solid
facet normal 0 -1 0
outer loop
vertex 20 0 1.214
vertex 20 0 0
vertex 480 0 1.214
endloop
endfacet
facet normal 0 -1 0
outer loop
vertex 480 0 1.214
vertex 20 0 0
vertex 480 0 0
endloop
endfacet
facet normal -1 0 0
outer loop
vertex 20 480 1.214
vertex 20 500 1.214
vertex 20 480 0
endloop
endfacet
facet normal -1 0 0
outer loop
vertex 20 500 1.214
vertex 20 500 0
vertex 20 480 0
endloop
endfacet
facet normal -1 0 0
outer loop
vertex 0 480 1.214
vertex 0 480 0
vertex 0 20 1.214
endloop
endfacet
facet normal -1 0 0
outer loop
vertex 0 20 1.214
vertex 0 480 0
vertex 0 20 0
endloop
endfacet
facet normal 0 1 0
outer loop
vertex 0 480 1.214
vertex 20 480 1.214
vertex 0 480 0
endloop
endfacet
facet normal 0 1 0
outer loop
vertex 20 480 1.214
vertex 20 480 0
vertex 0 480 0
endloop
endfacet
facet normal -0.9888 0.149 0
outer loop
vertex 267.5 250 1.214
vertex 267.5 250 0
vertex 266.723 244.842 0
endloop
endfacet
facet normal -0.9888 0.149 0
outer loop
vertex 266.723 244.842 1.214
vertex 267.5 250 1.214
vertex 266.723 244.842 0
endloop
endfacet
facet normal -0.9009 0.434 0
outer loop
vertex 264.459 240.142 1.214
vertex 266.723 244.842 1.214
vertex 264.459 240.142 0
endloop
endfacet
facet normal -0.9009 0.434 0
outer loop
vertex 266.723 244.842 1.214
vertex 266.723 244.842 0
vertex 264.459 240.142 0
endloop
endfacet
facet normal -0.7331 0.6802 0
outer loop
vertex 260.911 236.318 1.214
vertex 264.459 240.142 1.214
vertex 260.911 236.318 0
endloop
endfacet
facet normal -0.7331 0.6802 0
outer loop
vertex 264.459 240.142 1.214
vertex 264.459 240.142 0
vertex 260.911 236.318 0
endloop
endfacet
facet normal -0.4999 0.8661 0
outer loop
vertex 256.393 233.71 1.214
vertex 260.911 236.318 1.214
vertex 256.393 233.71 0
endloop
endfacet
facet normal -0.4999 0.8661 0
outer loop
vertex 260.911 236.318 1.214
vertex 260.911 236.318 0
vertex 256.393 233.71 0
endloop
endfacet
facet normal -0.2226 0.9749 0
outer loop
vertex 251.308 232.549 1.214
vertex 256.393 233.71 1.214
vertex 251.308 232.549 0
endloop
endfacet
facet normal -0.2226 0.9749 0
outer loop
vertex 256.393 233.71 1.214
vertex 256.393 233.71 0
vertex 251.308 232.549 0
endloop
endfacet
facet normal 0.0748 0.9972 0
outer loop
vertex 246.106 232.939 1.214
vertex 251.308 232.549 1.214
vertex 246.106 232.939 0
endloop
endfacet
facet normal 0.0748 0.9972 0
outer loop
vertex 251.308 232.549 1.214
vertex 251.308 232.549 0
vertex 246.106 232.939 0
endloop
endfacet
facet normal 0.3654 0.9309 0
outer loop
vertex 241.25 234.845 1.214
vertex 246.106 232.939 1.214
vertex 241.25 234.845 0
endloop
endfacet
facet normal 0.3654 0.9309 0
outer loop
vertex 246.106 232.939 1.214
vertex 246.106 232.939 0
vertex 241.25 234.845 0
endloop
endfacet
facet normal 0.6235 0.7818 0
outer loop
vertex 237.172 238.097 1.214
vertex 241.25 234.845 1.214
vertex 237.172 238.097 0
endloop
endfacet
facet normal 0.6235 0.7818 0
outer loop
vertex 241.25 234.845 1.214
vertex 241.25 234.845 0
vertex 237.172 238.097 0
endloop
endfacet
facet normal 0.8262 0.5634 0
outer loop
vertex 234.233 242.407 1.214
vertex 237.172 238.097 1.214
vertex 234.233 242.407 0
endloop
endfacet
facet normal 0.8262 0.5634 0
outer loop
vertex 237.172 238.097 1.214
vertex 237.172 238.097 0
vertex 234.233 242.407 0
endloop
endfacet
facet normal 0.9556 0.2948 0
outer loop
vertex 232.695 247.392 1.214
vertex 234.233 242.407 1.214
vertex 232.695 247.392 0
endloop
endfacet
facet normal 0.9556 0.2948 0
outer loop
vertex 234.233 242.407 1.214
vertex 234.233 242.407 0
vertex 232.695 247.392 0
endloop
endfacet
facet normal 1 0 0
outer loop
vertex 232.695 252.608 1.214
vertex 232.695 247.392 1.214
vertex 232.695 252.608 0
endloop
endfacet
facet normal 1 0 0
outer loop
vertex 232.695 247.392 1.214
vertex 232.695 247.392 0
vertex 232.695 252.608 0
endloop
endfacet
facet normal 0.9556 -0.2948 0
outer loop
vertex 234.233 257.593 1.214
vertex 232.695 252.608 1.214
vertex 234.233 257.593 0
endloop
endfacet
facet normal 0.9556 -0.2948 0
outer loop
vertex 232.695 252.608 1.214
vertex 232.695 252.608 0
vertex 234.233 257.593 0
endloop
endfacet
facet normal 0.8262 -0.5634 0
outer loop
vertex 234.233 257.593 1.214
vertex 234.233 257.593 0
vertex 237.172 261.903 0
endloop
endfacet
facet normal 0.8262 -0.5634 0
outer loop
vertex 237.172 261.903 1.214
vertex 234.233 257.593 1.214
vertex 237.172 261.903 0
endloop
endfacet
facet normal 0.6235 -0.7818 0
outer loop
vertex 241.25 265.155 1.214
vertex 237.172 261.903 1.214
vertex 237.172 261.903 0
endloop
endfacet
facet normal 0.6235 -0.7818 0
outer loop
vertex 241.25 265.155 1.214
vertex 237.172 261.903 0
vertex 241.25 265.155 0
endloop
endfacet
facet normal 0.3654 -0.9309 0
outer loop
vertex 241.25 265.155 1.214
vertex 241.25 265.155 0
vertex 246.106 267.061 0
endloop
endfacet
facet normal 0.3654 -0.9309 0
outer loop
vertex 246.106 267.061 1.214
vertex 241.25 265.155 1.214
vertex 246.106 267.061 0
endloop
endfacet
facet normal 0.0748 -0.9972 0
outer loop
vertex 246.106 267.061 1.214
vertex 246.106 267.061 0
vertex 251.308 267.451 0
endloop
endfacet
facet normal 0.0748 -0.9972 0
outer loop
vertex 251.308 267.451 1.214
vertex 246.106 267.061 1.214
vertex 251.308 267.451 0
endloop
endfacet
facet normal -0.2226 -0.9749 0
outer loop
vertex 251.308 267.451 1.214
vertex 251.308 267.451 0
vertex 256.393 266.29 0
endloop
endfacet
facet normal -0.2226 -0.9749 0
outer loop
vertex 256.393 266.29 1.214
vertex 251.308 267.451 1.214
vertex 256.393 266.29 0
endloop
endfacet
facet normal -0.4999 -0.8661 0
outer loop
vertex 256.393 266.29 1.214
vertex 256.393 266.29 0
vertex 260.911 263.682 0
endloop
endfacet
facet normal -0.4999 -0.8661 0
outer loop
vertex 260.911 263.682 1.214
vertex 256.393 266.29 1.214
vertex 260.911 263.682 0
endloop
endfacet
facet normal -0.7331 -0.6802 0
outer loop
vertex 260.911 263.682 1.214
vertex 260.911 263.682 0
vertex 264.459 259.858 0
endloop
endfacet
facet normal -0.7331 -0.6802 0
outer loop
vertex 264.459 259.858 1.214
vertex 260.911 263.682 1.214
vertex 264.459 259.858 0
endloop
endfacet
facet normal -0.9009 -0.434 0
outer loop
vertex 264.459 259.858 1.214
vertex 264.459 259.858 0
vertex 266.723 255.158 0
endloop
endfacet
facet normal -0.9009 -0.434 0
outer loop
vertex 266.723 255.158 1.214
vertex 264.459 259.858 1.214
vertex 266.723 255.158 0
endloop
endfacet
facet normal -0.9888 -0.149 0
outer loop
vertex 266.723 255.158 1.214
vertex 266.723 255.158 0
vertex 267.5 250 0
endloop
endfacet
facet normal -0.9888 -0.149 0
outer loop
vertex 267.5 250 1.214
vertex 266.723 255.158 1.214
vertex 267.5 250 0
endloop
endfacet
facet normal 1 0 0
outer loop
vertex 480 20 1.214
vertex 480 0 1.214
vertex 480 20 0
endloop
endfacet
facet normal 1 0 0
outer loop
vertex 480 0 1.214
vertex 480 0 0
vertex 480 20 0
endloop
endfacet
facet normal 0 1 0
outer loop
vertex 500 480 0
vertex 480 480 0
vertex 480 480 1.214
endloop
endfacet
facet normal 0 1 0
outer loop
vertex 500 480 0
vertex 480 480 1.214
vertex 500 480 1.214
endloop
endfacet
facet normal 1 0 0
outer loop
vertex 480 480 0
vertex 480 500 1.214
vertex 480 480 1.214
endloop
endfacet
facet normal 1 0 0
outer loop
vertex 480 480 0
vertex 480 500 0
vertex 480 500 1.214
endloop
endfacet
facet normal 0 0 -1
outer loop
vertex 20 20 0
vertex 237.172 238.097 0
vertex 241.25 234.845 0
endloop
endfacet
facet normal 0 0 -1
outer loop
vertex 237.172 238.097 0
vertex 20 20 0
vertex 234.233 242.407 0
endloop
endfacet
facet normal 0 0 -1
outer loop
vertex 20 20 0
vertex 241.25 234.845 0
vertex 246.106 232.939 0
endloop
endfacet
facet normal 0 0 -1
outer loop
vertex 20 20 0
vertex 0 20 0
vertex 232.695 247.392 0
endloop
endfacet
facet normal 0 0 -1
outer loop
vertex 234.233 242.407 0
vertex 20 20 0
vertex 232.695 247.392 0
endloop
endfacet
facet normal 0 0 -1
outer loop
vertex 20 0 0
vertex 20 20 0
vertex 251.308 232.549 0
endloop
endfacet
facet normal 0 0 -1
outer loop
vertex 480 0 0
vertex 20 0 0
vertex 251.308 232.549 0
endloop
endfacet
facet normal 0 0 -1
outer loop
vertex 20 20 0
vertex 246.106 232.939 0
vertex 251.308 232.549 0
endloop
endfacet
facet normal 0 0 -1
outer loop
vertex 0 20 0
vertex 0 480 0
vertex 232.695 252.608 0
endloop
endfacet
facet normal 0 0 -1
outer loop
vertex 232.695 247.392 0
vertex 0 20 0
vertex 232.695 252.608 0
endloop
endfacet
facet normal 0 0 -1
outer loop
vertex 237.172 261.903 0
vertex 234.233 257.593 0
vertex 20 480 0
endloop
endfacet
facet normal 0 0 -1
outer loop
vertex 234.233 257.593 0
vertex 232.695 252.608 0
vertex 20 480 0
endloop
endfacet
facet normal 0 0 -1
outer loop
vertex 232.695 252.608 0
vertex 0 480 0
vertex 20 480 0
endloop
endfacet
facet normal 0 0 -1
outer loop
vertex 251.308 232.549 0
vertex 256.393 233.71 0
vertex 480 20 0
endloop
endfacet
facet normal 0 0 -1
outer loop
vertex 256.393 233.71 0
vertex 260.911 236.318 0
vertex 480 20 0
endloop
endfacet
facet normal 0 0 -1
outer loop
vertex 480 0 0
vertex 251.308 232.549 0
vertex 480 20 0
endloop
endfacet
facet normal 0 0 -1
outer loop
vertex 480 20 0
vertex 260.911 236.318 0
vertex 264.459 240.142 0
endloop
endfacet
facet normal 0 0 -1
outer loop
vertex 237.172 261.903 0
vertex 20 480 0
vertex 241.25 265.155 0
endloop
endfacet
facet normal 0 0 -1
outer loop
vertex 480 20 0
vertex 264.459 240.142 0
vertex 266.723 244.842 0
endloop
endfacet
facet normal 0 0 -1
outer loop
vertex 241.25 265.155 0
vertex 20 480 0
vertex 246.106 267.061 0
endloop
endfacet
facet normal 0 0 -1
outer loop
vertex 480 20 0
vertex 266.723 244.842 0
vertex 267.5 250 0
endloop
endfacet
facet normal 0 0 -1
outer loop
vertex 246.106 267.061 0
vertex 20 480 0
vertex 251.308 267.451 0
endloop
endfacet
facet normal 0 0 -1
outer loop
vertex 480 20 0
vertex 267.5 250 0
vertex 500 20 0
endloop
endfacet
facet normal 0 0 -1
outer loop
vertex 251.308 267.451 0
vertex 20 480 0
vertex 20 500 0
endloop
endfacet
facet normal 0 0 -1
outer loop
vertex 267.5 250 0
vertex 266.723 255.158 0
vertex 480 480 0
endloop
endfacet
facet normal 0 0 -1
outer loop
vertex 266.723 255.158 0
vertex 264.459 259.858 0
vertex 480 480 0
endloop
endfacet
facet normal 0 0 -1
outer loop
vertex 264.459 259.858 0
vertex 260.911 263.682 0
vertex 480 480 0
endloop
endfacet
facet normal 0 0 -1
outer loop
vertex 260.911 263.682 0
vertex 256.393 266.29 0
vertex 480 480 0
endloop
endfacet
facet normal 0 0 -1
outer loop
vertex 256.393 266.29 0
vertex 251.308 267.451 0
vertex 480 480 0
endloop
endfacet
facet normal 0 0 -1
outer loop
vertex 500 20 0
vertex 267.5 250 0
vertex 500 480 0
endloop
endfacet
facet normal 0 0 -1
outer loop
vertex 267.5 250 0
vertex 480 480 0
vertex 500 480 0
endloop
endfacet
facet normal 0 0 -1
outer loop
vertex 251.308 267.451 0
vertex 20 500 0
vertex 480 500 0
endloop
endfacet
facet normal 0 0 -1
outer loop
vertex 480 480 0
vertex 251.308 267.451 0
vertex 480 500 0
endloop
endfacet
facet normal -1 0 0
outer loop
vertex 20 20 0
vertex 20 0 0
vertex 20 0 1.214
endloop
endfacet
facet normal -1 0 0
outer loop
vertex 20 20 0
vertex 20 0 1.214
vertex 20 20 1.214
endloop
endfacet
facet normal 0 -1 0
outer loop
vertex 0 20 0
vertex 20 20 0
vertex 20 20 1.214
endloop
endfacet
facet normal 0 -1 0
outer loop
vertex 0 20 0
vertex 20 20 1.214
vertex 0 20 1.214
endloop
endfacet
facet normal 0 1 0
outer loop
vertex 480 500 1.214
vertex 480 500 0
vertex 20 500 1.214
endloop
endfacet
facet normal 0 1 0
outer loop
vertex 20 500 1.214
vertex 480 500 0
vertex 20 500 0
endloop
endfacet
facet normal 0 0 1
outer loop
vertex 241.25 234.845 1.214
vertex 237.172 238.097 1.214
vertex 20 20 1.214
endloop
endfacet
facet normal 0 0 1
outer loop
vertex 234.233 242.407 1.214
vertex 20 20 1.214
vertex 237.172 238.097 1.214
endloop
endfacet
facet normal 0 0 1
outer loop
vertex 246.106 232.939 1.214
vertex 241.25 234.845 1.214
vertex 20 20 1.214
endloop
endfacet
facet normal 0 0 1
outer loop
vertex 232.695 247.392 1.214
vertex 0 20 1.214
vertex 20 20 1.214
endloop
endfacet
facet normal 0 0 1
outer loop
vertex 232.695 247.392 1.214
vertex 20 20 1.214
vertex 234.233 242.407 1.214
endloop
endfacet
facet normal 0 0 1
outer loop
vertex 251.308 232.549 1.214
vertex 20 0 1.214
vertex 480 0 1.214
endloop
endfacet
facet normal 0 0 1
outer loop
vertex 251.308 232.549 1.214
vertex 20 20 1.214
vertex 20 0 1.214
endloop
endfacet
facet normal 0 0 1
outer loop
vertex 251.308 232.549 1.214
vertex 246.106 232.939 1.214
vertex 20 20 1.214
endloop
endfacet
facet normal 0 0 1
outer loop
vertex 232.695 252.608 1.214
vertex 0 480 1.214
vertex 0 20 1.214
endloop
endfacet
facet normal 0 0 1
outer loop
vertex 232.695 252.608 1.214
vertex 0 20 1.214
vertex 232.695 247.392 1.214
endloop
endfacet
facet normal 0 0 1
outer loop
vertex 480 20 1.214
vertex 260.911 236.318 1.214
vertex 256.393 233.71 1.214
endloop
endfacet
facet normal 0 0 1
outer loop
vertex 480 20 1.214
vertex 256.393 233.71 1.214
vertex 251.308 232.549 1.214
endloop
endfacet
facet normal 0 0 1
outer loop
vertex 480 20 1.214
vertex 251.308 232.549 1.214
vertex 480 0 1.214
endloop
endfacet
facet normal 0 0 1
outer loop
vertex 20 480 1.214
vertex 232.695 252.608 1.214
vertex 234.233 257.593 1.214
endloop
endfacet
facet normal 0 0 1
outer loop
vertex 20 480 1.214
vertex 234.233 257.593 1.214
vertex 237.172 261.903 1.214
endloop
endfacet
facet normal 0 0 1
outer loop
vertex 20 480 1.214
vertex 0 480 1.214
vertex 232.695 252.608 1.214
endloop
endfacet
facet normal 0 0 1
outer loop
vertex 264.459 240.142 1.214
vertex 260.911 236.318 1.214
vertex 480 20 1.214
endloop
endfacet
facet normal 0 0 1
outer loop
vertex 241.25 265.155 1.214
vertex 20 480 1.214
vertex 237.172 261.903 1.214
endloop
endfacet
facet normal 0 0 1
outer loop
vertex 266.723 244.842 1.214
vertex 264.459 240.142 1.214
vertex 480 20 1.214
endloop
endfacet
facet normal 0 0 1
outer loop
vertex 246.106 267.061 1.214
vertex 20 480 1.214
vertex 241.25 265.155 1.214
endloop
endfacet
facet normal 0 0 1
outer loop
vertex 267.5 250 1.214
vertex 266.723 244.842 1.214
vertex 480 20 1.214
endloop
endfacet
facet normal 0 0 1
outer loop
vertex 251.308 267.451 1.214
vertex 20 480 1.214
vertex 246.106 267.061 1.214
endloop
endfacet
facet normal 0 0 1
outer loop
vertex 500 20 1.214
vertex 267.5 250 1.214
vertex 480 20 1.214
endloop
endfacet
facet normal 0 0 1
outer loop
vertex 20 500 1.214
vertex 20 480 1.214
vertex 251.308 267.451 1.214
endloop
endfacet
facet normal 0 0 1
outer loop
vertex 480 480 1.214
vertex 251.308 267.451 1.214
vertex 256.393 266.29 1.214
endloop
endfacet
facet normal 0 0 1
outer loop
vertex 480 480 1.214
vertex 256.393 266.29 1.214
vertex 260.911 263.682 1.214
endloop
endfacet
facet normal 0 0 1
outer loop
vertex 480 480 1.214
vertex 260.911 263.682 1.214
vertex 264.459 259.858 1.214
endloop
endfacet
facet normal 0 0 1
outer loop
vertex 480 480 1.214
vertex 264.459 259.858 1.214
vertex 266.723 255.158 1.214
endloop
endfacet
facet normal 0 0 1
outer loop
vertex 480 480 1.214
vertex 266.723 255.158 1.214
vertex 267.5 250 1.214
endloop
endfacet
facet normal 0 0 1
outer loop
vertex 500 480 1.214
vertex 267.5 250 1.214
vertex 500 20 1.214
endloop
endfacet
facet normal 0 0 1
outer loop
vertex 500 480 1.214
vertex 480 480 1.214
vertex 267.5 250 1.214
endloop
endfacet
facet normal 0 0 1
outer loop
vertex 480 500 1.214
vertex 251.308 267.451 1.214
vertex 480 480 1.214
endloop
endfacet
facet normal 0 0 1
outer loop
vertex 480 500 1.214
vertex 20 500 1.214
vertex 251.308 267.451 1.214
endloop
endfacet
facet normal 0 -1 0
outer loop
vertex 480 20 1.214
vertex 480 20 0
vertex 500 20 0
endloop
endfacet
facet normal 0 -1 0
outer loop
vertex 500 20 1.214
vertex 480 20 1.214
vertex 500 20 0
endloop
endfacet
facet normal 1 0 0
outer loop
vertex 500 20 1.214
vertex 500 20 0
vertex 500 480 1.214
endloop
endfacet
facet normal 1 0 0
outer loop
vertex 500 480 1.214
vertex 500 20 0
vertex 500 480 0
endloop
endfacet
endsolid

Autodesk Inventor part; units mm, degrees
ref_plane "YZ Plane" through (0, 0, 0) normal (1, 0, 0) x (0, 1, 0)
ref_plane "XZ Plane" through (0, 0, 0) normal (0, 1, 0) x (-1, 0, 0)
ref_plane "XY Plane" through (0, 0, 0) normal (0, 0, 1) x (1, 0, 0)
sketch "Sketch4" plane through (0, 0, 0) normal (0, 0, 1) x (1, 0, 0)
  line L0 (0, 0) -> (500, 0)
  line L1 (500, 0) -> (500, 500)
  line L2 (500, 500) -> (0, 500)
  line L3 (0, 500) -> (0, 0)
  dimension "d9" = 500
  dimension "d10" = 500
extrude "Plate2" add sketch "Sketch4" along normal blind 1.214
sketch "Sketch7" plane through (0, 0, 0) normal (0, 0, 1) x (1, 0, 0)
  line L0 (0, 0) -> (20, 0)
  line L1 (20, 0) -> (20, 20)
  line L2 (20, 20) -> (0, 20)
  line L3 (0, 20) -> (0, 0)
  dimension "d16" = 20
  dimension "d17" = 20
extrude "Cut4" cut sketch "Sketch7" along normal blind 1.214
sketch "Sketch8" plane through (0, 0, 0) normal (0, 0, 1) x (1, 0, 0)
  line L0 (500, 0) -> (500, 500) projected
  line L1 (500, 0) -> (480, 0)
  line L2 (480, 0) -> (480, 20)
  line L3 (480, 20) -> (500, 20)
  line L4 (500, 20) -> (500, 0)
  line L5 (500, 500) -> (480, 500)
  line L6 (480, 500) -> (480, 480)
  line L7 (480, 480) -> (500, 480)
  line L8 (500, 480) -> (500, 500)
  line L9 (500, 500) -> (0, 500) projected
  line L10 (0, 500) -> (20, 500)
  line L11 (20, 500) -> (20, 480)
  line L12 (20, 480) -> (0, 480)
  line L13 (0, 480) -> (0, 500)
  point P0 (0, 0)
  dimension "d20" = 20
  dimension "d21" = 20
  dimension "d22" = 20
  dimension "d23" = 20
  dimension "d24" = 20
  dimension "d25" = 20
extrude "Cut5" cut sketch "Sketch8" along normal blind 1.214
sketch "Sketch10" plane through (0, 0, 0) normal (0, 0, 1) x (1, 0, 0)
  line L0 (0, 0) -> (250, 0)
  line L1 (480, 0) -> (20, 0) projected
  line L2 (0, 0) -> (0, 250)
  line L3 (0, 250) -> (250, 250)
  circle A0 centre (250, 250) radius 17.5
  dimension "d31" = 250
  dimension "d32" = 250
  dimension "d33" = 35
extrude "Cut6" cut sketch "Sketch10" along normal up to next
equation "\"d18\" = Thickness"
equation "\"d26\" = Thickness"
equation "\"d34\" = Thickness"
equation "\"BendRadius\" = Thickness"
equation "\"BendReliefWidth\" = Thickness"
equation "\"BendReliefDepth\" = 0.5 * Thickness"
equation "\"CornerReliefSize\" = 4 * Thickness"
equation "\"MinimumRemnant\" = 2 * Thickness"
equation "\"TransitionRadius\" = BendRadius"
equation "\"JacobiRadiusSize\" = BendRadius"
equation "\"GapSize\" = Thickness"
equation "\"d2\" = BendRadius"
equation "\"d11\" = BendRadius"
equation "\"Thickness\" = 1.214"
properties part number "FrameSheetLaserViewport" material "Steel, Galvanized"
